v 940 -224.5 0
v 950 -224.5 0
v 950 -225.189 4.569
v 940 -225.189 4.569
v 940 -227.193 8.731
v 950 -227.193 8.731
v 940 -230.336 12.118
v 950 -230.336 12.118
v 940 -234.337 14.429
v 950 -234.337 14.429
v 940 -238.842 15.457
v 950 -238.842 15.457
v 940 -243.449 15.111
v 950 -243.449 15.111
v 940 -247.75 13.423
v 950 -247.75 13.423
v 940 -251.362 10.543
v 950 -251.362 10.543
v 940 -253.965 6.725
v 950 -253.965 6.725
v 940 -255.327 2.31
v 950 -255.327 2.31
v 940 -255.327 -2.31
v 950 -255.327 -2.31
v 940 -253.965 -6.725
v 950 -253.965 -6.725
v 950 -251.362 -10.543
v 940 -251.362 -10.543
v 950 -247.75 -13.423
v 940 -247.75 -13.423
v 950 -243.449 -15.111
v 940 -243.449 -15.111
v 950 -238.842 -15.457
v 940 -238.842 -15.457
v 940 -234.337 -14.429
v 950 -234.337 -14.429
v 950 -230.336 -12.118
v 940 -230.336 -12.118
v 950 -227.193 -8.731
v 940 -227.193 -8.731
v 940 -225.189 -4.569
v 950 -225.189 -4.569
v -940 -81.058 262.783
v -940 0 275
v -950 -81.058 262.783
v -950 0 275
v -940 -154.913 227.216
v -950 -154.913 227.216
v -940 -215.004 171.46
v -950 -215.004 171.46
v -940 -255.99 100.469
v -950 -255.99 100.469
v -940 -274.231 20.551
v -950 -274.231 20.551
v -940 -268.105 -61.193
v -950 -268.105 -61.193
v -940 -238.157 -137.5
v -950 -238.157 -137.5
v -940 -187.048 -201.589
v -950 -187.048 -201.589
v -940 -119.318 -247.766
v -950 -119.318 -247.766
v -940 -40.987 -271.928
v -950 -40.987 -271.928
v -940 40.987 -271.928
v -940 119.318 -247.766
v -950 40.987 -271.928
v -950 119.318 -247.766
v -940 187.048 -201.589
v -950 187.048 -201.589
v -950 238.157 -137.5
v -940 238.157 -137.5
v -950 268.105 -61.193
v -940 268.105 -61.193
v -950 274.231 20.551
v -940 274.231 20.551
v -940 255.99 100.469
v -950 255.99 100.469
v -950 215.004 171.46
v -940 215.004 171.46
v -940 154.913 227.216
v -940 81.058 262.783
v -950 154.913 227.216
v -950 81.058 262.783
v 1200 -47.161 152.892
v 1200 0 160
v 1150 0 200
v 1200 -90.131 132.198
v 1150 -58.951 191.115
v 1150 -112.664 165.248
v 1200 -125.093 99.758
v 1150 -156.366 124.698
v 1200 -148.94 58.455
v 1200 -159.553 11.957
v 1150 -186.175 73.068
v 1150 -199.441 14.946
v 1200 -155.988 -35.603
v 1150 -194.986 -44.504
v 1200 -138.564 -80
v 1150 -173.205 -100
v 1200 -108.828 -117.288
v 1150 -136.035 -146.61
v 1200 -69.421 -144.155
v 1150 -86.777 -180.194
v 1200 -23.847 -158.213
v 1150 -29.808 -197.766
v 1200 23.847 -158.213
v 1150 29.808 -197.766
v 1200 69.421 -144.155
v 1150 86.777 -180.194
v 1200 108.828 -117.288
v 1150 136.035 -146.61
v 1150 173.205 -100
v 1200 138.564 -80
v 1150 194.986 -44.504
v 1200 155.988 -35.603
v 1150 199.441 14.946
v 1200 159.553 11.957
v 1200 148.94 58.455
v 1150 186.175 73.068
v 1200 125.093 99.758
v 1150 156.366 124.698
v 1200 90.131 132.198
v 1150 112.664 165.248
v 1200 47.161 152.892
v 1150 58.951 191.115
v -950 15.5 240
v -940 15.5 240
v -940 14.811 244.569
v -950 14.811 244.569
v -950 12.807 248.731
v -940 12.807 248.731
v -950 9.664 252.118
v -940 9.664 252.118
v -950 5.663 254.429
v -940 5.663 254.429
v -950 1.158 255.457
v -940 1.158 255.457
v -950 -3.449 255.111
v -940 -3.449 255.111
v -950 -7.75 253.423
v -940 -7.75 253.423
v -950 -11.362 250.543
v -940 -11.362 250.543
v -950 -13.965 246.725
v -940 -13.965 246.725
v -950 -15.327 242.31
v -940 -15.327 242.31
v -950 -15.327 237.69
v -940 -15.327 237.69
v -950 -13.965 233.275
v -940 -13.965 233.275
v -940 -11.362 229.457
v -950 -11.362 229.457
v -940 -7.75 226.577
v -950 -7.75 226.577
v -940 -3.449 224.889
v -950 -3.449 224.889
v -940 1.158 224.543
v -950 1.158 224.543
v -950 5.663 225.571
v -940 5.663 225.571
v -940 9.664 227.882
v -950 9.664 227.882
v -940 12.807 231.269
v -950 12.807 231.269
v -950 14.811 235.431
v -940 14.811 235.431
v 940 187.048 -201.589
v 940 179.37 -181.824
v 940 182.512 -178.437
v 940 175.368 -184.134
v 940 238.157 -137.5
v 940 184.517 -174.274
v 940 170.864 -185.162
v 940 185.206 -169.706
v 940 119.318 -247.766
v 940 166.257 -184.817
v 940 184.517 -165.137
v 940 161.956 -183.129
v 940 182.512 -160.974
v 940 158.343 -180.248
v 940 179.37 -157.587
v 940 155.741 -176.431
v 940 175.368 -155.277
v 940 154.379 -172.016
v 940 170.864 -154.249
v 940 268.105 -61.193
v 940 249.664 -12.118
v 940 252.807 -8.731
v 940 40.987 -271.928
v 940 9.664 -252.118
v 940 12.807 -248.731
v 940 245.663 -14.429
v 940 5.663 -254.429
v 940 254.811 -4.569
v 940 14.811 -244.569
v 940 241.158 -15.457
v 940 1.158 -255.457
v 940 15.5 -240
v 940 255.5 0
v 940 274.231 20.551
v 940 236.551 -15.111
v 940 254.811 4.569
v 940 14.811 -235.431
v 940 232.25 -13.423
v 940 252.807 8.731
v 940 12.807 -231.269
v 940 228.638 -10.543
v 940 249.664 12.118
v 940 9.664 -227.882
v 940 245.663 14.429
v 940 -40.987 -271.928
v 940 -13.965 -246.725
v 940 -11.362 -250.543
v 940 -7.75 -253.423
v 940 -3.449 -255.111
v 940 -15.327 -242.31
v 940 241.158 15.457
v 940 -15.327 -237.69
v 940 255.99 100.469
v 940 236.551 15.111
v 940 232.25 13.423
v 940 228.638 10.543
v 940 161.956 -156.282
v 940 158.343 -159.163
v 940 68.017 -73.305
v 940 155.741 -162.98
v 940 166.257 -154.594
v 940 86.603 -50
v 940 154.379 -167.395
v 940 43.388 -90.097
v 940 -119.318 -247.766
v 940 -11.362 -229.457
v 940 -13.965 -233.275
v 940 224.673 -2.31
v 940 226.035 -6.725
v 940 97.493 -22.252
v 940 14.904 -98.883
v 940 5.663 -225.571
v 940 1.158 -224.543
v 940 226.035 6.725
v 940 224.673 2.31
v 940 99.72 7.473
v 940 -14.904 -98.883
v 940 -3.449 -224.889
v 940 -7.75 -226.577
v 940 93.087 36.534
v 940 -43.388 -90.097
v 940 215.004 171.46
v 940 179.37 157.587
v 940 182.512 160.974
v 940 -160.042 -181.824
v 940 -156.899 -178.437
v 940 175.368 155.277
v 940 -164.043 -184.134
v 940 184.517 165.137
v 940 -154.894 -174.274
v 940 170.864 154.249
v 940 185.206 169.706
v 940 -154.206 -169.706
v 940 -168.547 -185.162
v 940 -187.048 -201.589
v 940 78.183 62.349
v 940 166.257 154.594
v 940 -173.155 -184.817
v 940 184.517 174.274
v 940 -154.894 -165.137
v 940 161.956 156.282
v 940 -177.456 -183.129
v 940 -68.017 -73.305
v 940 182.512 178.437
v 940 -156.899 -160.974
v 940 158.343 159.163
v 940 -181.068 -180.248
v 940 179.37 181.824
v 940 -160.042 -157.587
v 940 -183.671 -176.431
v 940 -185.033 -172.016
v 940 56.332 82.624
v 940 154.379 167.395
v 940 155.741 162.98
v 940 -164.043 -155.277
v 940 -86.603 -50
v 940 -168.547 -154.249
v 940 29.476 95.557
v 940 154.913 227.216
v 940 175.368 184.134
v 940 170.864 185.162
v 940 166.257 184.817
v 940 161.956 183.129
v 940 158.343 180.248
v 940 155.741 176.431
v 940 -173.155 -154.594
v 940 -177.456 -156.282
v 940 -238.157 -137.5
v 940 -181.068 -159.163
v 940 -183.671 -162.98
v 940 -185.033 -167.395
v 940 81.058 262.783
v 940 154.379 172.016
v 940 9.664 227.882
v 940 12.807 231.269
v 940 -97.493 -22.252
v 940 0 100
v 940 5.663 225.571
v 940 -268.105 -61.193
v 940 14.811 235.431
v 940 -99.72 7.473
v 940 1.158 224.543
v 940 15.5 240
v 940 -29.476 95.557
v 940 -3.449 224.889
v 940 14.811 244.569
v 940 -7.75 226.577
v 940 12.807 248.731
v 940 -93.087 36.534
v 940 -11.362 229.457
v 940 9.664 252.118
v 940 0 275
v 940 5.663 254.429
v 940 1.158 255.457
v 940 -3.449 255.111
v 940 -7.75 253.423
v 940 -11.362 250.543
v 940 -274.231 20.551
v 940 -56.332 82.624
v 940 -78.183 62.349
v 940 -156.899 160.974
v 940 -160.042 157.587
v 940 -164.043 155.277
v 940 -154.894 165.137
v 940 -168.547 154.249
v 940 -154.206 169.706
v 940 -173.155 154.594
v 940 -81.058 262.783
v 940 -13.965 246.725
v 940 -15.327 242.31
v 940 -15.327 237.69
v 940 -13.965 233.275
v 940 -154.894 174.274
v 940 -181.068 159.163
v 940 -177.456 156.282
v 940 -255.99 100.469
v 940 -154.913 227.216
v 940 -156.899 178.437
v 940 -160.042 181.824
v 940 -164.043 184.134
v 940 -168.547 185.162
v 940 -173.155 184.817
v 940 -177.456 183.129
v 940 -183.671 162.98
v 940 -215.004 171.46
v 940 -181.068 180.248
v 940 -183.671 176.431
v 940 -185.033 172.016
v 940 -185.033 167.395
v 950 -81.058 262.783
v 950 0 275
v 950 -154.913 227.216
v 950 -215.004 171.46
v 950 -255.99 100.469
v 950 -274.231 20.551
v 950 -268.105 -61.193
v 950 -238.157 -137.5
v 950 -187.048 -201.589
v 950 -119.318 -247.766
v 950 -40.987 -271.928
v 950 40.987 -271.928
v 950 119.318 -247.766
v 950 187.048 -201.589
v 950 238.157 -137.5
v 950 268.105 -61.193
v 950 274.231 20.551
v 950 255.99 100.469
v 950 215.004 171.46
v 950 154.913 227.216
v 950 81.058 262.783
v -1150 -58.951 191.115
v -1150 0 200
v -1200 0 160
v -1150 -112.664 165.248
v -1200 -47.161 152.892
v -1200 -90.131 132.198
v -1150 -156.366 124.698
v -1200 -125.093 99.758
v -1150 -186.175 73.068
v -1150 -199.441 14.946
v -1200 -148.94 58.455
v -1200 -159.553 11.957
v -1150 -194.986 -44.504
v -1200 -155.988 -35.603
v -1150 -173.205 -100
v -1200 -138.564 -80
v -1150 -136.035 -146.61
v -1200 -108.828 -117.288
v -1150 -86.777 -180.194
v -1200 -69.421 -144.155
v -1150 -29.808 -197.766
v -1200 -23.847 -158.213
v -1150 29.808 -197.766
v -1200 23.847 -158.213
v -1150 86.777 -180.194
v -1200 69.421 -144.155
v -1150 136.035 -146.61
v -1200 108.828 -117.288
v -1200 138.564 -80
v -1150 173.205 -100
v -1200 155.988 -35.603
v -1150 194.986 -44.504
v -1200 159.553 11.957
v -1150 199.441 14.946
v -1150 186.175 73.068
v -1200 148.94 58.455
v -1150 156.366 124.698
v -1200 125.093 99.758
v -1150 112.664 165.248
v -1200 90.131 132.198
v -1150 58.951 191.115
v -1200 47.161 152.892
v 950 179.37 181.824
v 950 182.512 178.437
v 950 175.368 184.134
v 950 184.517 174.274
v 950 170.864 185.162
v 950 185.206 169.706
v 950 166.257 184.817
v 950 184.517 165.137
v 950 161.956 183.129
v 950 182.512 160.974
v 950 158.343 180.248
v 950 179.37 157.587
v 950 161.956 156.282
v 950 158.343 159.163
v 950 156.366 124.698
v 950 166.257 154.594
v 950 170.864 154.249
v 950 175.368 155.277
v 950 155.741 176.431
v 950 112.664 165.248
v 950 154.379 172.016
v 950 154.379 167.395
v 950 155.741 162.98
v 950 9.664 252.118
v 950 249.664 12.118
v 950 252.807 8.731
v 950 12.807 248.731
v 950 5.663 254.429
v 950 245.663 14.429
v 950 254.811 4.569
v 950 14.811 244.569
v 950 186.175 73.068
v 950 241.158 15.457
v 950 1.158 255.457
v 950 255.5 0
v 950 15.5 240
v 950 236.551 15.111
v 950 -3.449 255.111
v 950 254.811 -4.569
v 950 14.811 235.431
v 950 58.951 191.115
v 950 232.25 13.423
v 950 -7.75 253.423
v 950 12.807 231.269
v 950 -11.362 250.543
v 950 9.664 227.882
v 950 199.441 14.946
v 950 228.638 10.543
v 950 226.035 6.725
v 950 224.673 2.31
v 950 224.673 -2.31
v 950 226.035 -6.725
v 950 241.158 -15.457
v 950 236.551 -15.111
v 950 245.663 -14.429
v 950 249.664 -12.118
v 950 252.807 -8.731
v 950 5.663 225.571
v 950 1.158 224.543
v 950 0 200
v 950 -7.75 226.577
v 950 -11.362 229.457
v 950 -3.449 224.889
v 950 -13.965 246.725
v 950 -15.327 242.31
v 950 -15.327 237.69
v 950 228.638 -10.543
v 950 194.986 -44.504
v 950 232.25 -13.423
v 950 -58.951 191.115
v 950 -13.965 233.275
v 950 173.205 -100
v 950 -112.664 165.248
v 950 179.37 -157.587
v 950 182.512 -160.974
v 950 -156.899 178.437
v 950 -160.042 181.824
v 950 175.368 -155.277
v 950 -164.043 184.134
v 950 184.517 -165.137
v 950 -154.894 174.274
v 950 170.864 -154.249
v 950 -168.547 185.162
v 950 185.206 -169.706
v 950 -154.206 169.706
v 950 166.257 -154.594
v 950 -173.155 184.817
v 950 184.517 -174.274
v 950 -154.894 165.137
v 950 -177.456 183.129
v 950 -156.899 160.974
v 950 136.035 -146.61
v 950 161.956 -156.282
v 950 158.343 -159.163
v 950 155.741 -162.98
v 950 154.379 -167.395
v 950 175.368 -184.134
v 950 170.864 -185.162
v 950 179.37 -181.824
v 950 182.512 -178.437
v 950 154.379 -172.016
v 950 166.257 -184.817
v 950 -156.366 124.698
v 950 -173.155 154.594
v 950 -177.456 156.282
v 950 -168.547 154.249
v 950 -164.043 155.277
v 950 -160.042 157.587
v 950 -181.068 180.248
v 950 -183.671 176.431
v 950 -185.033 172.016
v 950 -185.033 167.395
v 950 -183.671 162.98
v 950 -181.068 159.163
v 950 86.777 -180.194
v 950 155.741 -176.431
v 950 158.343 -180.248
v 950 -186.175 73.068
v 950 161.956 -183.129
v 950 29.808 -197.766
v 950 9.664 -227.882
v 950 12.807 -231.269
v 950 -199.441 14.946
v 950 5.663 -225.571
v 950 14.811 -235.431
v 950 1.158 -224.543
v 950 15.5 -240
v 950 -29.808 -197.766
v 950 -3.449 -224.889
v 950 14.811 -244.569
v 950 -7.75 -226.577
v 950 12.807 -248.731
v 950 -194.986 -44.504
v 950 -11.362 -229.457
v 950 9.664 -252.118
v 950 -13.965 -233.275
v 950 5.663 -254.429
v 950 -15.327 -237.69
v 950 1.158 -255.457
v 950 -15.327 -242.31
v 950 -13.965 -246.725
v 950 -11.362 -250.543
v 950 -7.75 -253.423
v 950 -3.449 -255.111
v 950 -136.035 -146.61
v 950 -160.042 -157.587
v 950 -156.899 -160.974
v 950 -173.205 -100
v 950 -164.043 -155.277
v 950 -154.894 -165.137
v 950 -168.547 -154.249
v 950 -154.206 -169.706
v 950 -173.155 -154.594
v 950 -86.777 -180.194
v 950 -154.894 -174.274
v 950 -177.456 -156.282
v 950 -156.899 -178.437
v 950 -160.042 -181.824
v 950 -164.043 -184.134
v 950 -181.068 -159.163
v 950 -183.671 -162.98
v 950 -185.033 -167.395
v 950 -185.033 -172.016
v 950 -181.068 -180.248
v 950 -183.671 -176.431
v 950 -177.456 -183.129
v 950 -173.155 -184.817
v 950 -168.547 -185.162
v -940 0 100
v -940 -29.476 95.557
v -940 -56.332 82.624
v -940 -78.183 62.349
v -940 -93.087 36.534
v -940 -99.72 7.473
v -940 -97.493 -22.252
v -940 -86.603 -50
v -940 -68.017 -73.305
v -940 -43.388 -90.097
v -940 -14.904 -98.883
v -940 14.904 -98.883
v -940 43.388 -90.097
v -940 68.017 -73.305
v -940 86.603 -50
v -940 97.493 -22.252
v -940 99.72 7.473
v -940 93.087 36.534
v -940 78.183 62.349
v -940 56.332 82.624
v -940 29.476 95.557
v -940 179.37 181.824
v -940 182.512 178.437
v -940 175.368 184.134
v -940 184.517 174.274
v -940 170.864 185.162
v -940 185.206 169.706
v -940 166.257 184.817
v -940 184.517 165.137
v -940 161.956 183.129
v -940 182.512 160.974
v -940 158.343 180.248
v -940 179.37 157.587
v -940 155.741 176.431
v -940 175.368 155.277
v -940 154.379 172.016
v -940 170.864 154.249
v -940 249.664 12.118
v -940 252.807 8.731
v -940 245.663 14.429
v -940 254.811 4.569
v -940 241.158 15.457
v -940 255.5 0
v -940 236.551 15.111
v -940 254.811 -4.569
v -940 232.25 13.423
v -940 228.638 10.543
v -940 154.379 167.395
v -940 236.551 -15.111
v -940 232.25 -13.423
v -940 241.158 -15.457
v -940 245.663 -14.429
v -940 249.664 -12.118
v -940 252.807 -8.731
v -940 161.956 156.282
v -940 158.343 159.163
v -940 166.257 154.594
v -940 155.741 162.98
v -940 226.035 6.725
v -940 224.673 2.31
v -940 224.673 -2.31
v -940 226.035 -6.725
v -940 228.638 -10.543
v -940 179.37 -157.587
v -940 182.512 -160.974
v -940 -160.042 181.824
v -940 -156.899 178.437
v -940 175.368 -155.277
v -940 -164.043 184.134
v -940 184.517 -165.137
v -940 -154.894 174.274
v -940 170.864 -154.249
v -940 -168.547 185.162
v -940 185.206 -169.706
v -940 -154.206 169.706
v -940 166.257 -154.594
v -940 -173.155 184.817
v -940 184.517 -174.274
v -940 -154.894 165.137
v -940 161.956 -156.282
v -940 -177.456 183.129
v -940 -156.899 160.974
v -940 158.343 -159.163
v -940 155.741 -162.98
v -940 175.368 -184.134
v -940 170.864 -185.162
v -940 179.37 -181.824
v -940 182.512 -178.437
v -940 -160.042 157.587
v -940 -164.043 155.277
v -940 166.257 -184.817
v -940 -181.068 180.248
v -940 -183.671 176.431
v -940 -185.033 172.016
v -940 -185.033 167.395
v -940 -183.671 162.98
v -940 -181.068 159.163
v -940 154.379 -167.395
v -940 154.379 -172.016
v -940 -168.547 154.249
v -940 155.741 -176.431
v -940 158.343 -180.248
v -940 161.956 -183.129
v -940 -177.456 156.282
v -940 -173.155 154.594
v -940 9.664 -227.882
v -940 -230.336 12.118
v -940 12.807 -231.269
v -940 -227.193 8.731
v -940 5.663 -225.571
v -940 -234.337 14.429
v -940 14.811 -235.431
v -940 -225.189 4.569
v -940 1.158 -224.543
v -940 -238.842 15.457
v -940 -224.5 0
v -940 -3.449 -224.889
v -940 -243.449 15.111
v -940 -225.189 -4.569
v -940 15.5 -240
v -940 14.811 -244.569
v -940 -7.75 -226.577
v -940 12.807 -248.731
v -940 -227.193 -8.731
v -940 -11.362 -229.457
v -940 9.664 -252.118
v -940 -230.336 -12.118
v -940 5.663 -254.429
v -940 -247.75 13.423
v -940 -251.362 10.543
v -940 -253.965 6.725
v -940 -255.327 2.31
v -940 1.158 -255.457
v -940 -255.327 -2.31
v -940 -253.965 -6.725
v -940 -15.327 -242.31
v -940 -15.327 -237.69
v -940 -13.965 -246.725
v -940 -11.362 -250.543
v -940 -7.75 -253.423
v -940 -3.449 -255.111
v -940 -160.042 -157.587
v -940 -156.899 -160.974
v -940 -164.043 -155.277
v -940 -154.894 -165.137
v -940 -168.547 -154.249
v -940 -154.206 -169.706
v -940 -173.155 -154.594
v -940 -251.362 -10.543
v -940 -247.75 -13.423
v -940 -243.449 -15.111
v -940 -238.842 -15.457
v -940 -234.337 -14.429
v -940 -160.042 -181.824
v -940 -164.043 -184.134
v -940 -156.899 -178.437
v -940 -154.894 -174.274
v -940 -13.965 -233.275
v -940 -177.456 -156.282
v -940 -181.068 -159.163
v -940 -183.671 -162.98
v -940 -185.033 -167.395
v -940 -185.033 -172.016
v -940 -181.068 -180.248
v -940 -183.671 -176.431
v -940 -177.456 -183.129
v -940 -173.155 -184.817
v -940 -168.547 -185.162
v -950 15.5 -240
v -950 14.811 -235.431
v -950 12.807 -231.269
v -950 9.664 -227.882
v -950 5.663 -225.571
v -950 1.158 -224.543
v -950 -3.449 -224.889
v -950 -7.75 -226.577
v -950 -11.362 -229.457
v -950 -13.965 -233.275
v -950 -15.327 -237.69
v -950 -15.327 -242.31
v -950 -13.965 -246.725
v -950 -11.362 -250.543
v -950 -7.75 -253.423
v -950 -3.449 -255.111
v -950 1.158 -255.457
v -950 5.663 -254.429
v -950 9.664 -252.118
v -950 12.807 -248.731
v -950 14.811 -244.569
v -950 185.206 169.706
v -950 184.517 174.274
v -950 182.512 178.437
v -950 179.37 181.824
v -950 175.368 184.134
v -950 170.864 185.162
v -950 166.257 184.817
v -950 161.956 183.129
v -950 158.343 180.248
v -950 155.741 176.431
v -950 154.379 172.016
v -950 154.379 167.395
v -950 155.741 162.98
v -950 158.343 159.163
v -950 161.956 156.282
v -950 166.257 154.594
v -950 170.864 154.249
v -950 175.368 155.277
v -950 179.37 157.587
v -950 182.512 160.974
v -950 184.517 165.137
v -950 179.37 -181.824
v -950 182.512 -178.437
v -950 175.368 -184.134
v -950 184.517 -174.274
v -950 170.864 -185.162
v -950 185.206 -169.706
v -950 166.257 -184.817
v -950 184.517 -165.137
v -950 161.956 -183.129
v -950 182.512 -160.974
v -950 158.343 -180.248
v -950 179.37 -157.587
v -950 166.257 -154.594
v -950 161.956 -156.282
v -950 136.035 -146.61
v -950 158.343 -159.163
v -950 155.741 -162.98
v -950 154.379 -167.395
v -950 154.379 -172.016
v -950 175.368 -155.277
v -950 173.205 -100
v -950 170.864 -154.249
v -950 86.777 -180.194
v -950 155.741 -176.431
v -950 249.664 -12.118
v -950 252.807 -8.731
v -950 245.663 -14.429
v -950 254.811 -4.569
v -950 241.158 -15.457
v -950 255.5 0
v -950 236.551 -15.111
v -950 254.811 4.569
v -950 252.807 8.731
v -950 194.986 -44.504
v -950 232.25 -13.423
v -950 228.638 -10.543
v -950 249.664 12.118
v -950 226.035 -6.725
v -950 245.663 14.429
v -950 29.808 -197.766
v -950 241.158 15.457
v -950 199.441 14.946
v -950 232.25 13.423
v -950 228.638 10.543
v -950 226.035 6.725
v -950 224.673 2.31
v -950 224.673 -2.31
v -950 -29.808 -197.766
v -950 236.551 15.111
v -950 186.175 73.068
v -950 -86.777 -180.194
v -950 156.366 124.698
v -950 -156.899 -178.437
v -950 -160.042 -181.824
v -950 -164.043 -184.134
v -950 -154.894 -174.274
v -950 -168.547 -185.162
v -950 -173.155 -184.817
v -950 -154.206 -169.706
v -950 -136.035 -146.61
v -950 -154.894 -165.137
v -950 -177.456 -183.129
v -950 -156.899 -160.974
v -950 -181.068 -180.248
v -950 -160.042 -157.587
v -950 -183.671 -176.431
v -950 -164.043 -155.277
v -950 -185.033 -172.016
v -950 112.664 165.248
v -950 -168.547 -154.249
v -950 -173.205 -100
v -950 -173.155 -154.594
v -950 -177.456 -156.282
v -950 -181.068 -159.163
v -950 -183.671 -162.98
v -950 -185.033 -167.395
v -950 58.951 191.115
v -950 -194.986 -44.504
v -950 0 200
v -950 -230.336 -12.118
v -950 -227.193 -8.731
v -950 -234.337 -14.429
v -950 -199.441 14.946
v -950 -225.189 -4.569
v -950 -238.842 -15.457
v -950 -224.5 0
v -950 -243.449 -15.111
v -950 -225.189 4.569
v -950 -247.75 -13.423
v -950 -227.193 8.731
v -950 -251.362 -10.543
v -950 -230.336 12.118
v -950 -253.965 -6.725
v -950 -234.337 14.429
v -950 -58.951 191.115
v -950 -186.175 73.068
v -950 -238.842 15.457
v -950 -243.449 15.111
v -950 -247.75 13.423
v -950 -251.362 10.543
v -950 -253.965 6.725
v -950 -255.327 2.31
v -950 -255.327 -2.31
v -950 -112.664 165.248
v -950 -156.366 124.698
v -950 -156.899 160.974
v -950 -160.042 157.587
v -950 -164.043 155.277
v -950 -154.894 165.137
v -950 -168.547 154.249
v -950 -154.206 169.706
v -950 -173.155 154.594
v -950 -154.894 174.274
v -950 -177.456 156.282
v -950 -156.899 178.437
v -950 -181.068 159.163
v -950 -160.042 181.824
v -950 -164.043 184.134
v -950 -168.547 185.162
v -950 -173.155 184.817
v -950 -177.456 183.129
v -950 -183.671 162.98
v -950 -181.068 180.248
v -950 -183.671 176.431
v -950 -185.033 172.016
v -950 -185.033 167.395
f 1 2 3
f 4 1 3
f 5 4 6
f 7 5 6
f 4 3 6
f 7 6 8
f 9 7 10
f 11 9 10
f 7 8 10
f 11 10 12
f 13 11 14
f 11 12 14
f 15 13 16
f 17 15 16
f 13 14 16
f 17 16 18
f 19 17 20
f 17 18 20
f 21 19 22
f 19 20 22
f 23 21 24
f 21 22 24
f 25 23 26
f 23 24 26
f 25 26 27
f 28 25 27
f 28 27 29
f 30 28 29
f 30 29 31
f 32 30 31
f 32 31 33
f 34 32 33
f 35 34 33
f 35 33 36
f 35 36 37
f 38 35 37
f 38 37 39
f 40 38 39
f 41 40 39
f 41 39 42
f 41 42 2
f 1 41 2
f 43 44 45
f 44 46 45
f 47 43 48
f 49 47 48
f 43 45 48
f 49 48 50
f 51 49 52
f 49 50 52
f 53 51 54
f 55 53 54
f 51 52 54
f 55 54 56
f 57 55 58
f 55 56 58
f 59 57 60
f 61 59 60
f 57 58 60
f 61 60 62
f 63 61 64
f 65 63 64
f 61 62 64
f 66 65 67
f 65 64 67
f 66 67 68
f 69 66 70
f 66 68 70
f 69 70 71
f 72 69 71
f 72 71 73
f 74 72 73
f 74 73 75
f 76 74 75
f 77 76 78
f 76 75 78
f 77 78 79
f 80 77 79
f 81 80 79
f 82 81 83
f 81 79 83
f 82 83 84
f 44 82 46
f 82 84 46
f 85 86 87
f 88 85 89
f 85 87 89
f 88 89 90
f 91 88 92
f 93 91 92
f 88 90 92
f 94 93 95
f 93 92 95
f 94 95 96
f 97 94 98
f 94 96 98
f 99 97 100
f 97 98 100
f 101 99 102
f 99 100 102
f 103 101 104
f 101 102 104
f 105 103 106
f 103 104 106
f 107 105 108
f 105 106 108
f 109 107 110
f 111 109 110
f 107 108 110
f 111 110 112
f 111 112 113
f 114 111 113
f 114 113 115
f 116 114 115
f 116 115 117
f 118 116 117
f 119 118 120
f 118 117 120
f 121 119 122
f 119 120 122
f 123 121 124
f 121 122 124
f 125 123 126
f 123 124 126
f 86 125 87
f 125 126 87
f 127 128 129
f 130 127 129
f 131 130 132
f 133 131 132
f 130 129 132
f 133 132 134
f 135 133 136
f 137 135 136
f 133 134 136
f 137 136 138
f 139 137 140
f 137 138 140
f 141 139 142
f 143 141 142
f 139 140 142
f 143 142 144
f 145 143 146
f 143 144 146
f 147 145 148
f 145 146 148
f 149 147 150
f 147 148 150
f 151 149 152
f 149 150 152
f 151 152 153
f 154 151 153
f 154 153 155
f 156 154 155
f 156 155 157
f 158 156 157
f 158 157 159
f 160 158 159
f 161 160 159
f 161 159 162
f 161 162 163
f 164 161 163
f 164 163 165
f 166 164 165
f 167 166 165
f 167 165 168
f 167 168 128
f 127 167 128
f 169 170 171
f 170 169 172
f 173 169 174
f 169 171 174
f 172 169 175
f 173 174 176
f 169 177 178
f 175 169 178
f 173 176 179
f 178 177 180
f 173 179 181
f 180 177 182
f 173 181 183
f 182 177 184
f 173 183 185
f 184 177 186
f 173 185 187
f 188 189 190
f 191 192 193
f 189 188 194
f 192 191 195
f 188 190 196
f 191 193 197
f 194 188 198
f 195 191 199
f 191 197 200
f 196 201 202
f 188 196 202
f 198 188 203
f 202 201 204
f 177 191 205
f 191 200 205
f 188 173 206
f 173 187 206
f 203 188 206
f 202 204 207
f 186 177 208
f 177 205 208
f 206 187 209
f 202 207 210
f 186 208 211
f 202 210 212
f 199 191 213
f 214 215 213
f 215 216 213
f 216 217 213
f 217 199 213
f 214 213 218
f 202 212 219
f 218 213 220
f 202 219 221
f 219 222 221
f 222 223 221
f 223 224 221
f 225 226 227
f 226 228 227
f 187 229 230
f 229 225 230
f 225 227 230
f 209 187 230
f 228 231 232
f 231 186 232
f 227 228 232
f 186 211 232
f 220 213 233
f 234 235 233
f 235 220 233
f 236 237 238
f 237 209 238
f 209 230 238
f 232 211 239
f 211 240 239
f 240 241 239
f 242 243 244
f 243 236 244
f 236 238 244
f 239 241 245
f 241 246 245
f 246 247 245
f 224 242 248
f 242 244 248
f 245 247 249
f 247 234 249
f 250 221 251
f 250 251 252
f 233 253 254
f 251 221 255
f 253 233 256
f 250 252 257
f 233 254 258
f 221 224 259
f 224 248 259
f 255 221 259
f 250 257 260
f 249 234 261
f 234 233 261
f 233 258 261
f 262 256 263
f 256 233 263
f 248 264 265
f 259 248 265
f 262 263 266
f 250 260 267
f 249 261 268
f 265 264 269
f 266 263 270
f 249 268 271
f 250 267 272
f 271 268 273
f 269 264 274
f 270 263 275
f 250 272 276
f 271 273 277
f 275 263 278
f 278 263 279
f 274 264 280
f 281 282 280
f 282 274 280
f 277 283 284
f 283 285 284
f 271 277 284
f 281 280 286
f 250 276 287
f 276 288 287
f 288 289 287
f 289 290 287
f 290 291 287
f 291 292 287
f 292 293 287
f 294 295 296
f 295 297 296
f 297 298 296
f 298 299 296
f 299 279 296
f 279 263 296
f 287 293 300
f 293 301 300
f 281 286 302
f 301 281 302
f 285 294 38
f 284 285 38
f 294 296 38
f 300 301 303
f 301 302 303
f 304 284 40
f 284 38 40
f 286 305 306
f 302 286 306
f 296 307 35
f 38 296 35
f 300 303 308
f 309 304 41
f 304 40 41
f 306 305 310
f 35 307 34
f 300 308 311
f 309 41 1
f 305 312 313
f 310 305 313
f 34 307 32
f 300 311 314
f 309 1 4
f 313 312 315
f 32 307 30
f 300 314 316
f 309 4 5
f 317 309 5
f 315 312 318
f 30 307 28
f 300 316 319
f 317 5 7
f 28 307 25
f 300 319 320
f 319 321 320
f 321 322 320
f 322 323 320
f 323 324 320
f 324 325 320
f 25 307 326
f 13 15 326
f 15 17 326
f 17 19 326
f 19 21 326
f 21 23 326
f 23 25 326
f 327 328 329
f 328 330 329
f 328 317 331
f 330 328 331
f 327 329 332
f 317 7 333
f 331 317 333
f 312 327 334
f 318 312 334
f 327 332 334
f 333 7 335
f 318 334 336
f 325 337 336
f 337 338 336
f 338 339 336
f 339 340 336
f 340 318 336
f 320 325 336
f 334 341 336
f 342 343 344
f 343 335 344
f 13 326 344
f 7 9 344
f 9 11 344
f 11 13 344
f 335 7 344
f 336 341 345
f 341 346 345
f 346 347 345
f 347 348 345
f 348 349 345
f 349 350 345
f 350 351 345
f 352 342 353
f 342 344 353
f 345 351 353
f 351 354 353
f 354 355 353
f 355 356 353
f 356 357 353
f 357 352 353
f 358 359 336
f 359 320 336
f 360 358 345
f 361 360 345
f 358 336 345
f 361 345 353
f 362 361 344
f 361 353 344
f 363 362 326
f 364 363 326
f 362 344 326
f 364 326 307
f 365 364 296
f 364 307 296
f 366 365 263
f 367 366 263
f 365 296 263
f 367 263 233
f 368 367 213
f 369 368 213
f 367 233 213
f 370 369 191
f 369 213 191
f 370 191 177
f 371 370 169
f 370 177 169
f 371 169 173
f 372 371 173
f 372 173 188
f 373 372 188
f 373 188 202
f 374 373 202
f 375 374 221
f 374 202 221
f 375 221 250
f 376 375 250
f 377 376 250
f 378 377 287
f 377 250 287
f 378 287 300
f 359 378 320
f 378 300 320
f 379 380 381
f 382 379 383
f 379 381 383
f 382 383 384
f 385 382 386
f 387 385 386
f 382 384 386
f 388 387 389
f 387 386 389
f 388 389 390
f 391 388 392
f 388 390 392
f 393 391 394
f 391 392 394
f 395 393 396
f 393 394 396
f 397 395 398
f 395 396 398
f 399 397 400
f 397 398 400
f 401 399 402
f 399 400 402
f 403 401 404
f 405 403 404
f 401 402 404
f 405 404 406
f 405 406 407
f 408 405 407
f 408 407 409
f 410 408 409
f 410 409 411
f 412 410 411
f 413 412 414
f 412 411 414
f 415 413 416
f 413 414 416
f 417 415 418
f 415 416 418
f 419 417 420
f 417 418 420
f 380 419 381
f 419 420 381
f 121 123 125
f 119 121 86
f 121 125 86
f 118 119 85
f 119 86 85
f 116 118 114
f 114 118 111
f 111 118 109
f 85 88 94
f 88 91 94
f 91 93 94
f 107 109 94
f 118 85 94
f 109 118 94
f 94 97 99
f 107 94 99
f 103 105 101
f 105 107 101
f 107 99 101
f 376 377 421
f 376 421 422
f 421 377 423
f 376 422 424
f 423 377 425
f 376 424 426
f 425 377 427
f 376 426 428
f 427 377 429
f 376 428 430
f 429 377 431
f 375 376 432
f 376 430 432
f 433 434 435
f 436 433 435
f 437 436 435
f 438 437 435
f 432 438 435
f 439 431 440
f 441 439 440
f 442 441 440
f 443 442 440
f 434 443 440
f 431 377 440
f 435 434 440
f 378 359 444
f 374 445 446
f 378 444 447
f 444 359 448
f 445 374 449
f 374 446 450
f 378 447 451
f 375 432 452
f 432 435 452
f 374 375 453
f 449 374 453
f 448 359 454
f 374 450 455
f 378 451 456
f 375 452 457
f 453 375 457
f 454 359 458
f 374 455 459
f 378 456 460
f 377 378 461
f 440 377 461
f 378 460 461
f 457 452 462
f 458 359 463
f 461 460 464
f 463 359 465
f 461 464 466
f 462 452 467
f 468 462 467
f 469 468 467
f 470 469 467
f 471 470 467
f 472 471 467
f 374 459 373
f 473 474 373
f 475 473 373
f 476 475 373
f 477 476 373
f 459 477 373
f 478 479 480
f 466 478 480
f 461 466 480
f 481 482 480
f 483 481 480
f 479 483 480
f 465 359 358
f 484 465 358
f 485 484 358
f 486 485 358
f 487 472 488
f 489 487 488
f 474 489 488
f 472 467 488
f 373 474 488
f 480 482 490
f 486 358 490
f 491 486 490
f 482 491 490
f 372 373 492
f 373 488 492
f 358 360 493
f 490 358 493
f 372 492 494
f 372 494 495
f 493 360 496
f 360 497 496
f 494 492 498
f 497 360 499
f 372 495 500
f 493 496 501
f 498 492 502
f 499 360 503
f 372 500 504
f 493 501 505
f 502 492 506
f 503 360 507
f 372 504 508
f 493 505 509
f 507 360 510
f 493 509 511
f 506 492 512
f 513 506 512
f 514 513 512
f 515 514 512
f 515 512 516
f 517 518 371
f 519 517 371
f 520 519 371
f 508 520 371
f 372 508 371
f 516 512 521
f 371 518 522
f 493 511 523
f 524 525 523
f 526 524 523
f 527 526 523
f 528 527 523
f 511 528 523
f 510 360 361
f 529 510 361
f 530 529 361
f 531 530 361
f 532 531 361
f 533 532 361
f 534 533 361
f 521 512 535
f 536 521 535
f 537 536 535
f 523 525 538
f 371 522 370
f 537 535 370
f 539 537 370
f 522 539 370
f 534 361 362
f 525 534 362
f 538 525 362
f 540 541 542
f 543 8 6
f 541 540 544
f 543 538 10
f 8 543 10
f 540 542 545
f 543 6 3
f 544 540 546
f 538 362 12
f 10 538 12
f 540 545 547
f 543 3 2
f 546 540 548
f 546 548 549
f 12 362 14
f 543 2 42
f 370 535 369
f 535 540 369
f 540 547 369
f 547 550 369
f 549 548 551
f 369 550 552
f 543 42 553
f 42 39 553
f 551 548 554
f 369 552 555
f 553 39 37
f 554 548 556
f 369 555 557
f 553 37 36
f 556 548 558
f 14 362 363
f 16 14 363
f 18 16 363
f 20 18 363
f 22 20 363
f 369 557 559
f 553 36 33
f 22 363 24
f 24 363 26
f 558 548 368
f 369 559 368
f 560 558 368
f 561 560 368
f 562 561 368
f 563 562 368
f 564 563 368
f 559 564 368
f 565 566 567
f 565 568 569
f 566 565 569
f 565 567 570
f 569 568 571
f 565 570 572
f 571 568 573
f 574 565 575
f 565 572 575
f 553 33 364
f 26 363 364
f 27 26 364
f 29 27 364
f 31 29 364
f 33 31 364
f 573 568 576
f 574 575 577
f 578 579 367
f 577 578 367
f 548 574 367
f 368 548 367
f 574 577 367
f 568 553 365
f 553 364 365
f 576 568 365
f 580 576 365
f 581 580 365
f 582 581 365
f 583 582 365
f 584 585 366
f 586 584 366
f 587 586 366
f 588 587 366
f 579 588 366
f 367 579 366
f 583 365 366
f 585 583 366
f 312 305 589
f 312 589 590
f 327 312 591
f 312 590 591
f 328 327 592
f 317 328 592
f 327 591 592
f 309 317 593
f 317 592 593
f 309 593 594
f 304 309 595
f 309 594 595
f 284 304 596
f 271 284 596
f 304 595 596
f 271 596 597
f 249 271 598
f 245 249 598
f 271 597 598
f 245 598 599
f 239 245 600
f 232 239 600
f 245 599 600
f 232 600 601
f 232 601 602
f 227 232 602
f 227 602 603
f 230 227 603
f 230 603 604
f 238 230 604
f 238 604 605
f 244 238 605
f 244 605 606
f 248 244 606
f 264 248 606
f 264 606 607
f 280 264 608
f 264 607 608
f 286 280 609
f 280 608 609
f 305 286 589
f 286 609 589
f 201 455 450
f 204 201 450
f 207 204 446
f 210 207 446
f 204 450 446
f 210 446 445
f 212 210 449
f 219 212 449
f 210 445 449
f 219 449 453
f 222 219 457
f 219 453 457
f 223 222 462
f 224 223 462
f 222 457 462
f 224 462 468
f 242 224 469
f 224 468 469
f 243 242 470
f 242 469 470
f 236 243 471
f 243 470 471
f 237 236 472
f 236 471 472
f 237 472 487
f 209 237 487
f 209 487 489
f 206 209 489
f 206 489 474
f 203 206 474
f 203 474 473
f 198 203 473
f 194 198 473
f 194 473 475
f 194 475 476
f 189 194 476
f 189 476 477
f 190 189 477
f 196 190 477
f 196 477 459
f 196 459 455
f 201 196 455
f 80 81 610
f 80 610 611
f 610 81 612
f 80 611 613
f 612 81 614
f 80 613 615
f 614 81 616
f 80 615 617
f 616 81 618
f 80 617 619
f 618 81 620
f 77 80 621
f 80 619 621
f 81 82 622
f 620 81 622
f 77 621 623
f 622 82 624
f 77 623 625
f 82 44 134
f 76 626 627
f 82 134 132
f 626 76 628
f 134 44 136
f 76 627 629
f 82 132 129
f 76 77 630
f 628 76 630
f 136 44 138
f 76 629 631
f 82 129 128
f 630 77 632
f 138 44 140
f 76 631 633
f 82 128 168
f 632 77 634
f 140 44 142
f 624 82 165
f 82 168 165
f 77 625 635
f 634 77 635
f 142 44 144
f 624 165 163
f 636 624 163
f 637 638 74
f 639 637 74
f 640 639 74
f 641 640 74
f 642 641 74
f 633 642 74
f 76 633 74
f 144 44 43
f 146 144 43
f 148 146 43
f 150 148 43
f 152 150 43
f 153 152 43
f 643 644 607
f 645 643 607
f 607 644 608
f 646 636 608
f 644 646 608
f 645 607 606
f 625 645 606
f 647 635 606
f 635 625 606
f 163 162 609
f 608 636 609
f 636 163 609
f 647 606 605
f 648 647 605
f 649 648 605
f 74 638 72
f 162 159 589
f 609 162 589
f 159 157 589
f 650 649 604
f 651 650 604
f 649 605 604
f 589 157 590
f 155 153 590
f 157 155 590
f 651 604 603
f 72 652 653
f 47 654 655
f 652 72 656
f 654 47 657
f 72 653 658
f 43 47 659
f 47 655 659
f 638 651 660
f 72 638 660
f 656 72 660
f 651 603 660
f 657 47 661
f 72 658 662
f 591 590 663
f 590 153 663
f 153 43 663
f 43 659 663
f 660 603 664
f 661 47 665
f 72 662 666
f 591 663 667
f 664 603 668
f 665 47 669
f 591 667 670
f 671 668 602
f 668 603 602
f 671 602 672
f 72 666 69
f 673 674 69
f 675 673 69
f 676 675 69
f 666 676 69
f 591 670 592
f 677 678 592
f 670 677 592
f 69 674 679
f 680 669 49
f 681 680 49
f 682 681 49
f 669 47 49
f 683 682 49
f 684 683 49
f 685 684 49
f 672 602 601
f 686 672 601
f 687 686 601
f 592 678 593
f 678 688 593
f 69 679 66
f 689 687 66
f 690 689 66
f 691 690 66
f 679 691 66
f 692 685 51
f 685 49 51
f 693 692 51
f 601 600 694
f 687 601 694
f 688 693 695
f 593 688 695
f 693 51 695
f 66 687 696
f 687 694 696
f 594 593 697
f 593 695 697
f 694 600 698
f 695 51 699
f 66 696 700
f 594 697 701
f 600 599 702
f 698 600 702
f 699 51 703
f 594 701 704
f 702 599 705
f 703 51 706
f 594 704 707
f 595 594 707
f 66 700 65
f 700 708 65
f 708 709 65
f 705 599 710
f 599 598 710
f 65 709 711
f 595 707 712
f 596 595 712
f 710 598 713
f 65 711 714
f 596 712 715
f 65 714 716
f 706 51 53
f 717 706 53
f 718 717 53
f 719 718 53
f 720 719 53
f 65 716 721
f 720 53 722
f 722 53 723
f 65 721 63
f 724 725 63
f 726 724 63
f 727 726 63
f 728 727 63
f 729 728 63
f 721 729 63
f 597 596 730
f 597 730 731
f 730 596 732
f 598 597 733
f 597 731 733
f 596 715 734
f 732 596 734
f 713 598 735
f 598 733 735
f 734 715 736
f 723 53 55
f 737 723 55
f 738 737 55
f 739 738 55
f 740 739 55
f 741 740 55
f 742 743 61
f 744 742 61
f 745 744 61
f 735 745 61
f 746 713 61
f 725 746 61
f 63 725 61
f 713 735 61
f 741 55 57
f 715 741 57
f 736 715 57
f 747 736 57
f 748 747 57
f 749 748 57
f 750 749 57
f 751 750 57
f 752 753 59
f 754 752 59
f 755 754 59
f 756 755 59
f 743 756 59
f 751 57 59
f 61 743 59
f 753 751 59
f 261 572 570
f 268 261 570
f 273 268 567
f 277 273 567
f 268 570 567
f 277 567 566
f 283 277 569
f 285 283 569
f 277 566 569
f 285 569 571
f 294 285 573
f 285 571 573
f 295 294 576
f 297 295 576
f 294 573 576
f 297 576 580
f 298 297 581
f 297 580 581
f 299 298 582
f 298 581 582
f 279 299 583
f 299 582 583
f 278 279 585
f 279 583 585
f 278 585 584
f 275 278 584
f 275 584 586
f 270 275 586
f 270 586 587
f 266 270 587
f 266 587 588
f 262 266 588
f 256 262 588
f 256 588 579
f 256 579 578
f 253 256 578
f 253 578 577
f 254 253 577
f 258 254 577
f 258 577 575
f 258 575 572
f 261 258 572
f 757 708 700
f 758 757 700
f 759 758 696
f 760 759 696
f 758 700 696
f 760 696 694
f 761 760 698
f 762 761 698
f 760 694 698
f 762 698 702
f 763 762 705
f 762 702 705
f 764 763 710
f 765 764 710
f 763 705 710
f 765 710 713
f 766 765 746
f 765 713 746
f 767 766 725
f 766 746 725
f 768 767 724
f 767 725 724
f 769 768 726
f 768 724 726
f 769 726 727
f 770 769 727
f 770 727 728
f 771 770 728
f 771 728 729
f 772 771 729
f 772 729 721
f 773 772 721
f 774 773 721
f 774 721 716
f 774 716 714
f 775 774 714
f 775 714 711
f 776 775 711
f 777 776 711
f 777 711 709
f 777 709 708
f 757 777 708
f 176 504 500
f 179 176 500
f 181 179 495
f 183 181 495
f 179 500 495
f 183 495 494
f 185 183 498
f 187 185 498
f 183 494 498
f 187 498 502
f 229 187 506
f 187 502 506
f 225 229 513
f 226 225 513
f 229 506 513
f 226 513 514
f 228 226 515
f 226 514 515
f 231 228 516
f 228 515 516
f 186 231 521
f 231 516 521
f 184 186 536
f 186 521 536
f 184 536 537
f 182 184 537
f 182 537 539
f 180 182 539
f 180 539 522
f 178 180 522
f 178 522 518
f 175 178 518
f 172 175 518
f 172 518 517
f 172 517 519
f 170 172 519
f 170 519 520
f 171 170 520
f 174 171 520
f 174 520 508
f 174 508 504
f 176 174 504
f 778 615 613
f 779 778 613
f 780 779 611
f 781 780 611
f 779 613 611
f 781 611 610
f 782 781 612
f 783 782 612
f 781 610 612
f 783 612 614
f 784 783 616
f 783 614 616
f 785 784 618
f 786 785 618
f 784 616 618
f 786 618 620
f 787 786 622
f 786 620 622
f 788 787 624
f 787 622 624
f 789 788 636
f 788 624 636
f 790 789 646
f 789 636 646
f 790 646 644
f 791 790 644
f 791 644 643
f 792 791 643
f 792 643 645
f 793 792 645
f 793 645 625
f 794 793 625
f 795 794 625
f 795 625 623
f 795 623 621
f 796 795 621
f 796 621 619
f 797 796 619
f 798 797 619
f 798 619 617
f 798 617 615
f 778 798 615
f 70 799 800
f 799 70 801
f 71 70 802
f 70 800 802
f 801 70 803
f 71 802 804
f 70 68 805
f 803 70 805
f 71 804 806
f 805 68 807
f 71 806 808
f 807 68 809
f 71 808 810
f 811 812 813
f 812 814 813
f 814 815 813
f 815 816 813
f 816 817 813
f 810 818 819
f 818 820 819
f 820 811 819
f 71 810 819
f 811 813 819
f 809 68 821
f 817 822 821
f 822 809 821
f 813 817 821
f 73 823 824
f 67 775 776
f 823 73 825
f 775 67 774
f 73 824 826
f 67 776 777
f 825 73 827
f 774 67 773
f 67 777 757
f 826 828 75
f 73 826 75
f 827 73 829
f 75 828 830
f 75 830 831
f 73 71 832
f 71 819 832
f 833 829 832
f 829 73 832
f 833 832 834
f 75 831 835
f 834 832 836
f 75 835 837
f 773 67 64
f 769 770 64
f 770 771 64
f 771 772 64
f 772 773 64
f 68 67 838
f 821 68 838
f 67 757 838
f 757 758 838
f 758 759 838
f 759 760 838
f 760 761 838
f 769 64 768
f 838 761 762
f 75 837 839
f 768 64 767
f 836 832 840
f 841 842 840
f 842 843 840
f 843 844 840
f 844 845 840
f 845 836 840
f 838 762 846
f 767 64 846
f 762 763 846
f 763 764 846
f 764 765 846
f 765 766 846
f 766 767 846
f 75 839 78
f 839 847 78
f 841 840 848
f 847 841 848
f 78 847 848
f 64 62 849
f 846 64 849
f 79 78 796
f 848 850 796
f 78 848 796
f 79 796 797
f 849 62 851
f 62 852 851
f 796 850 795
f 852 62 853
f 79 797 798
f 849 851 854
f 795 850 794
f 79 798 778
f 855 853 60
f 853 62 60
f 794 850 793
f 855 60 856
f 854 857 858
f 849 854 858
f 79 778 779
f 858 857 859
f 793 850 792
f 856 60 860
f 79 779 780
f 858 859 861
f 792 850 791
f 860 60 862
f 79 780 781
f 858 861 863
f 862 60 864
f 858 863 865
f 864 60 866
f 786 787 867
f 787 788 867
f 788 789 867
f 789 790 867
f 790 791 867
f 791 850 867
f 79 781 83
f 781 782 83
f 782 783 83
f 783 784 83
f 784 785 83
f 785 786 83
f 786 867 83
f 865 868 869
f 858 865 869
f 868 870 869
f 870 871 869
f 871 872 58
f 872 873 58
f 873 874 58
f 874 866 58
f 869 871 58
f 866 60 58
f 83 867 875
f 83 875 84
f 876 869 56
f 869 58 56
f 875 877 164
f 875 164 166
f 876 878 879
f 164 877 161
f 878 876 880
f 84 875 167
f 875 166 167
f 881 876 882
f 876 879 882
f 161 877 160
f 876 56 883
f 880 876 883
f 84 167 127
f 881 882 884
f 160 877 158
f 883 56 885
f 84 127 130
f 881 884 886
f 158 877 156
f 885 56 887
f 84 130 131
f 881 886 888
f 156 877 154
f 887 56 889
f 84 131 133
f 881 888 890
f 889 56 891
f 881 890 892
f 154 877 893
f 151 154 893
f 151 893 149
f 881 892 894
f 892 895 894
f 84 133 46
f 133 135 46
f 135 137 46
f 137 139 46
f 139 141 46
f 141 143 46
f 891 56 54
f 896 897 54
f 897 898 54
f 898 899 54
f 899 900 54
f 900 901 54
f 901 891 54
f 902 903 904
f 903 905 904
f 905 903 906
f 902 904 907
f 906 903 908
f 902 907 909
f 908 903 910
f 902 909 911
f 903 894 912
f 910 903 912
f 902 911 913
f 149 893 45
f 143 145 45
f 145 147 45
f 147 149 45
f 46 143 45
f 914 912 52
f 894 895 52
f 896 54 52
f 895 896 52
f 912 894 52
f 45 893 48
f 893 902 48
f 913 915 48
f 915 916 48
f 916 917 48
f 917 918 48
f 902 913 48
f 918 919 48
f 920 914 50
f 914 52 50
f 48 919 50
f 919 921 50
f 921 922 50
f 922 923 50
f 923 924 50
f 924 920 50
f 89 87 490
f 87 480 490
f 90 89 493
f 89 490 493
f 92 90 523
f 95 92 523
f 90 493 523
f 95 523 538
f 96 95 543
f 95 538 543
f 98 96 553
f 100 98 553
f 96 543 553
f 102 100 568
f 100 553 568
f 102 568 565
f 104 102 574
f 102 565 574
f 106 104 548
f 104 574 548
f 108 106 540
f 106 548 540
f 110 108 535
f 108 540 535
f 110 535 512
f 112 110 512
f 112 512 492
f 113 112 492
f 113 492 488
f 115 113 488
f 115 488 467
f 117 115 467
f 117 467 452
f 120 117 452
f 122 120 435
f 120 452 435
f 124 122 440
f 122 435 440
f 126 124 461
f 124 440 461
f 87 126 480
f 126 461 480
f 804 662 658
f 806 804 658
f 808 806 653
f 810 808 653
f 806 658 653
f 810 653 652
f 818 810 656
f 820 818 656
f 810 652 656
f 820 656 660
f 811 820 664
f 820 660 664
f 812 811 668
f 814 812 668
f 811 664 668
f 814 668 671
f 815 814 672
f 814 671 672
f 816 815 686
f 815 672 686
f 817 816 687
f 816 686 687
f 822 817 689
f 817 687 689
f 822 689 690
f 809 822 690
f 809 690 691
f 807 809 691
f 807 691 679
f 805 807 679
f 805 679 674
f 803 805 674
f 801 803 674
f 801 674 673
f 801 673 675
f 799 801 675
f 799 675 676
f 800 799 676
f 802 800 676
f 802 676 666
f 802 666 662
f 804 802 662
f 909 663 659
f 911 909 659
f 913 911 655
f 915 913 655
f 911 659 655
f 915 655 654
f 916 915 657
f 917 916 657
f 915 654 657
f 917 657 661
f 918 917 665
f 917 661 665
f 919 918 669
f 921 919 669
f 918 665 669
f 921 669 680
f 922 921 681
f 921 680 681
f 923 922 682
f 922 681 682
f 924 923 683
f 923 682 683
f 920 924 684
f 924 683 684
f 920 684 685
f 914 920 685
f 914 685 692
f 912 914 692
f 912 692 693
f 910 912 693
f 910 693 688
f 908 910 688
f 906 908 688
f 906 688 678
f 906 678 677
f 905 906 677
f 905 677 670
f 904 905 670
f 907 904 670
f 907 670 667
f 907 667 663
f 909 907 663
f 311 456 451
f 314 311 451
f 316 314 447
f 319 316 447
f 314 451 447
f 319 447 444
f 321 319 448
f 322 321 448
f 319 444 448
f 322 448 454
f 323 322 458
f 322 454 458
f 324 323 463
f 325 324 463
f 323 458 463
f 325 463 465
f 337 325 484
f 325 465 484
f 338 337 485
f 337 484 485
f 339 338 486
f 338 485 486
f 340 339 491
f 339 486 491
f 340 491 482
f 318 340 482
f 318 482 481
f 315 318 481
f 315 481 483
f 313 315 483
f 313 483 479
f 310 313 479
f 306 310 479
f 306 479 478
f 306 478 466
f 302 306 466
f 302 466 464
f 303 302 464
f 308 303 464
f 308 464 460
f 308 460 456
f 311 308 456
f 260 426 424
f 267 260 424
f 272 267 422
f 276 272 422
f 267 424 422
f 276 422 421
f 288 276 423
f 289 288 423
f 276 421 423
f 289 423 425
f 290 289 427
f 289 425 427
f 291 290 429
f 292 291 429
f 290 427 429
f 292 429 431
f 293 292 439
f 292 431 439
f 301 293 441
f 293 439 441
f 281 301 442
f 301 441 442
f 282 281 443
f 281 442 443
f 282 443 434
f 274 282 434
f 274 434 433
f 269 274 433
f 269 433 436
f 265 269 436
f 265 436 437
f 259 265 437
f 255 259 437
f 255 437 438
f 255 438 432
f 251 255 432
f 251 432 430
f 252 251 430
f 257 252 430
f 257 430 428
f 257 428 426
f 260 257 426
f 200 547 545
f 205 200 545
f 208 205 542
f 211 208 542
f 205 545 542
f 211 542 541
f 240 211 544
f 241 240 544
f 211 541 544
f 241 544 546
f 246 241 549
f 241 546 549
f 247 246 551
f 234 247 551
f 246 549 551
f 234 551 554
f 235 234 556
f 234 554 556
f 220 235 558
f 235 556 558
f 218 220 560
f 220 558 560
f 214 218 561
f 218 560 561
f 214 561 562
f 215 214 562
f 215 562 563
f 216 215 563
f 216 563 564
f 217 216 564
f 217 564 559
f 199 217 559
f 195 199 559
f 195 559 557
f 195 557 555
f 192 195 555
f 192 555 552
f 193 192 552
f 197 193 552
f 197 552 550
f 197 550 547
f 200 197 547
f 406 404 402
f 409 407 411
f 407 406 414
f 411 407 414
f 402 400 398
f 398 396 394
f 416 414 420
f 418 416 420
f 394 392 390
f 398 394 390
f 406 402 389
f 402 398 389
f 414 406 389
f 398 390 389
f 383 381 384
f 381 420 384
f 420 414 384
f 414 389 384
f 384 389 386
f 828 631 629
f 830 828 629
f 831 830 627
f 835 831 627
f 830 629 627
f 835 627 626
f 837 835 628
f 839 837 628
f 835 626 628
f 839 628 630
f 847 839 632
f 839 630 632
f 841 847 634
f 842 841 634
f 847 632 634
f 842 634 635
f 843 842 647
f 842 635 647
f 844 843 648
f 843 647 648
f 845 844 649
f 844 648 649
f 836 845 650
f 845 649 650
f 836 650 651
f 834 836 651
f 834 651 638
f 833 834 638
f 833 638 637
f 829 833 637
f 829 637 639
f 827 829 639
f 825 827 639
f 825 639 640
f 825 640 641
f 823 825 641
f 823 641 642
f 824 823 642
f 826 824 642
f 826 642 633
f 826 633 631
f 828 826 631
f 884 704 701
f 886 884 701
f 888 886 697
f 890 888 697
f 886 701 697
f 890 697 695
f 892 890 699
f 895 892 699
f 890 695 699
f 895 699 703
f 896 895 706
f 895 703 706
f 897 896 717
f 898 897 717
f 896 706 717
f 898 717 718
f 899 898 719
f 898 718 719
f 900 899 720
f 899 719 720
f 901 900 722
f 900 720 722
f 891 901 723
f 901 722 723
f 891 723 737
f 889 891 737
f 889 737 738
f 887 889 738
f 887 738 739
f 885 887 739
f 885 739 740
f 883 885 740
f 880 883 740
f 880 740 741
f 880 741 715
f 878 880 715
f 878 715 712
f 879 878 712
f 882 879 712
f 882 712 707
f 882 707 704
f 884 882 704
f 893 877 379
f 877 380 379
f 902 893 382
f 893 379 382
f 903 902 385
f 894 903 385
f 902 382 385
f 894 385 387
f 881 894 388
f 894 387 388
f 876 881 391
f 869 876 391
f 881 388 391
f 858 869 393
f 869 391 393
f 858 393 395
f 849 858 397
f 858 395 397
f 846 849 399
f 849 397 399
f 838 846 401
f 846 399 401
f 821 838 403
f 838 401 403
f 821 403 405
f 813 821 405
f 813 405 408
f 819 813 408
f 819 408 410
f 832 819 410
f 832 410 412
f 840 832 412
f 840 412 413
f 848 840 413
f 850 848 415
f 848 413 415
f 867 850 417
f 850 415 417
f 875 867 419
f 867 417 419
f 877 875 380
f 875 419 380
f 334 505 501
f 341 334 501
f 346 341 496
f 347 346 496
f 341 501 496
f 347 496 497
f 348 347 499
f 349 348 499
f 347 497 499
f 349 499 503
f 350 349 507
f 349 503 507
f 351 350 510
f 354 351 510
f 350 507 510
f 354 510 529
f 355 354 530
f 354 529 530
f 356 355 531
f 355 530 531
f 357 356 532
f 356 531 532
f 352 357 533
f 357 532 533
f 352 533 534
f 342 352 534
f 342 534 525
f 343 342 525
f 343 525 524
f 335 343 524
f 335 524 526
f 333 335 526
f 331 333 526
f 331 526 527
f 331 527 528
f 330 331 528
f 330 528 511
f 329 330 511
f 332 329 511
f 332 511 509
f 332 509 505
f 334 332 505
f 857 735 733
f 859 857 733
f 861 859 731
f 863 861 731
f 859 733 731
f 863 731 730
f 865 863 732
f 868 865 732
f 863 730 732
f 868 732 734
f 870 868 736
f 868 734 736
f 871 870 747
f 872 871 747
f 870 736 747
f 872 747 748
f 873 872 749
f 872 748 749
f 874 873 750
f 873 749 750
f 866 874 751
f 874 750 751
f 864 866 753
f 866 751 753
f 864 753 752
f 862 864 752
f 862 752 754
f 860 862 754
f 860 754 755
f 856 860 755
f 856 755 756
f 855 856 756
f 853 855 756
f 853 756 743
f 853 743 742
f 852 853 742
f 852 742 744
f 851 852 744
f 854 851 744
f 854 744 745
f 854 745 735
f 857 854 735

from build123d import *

# Parameters (mm, degrees)
F2_R     = 15.5
F3_DEPTH = 2150.001


with BuildPart() as f1:
    # F0 (on Front) → F1 (revolve)
    with BuildSketch(Plane.XZ):
        Polygon((940, 100), (-940, 100), (-940, 275), (-950, 275), (-950, 200), (-1150, 200), (-1200, 160), (-1200, 0), (1200, 0), (1200, 160), (1150, 200), (950, 200), (950, 275), (940, 275), align=None)
    revolve(axis=Axis((0, 0, 0), (1, 0, 0)))

    # F2 (on face) → F3 (cut, through all)
    with BuildSketch(Plane.YZ.offset(950)):
        with Locations((0, 240)):
            Circle(F2_R)
        with Locations((-169.705627, 169.705627)):
            Circle(F2_R)
        with Locations((-240, 0)):
            Circle(F2_R)
        with Locations((-169.705627, -169.705627)):
            Circle(F2_R)
        with Locations((0, -240)):
            Circle(F2_R)
        with Locations((169.705627, -169.705627)):
            Circle(F2_R)
        with Locations((240, 0)):
            Circle(F2_R)
        with Locations((169.705627, 169.705627)):
            Circle(F2_R)
    extrude(amount=-F3_DEPTH, mode=Mode.SUBTRACT)


solid = f1.part
